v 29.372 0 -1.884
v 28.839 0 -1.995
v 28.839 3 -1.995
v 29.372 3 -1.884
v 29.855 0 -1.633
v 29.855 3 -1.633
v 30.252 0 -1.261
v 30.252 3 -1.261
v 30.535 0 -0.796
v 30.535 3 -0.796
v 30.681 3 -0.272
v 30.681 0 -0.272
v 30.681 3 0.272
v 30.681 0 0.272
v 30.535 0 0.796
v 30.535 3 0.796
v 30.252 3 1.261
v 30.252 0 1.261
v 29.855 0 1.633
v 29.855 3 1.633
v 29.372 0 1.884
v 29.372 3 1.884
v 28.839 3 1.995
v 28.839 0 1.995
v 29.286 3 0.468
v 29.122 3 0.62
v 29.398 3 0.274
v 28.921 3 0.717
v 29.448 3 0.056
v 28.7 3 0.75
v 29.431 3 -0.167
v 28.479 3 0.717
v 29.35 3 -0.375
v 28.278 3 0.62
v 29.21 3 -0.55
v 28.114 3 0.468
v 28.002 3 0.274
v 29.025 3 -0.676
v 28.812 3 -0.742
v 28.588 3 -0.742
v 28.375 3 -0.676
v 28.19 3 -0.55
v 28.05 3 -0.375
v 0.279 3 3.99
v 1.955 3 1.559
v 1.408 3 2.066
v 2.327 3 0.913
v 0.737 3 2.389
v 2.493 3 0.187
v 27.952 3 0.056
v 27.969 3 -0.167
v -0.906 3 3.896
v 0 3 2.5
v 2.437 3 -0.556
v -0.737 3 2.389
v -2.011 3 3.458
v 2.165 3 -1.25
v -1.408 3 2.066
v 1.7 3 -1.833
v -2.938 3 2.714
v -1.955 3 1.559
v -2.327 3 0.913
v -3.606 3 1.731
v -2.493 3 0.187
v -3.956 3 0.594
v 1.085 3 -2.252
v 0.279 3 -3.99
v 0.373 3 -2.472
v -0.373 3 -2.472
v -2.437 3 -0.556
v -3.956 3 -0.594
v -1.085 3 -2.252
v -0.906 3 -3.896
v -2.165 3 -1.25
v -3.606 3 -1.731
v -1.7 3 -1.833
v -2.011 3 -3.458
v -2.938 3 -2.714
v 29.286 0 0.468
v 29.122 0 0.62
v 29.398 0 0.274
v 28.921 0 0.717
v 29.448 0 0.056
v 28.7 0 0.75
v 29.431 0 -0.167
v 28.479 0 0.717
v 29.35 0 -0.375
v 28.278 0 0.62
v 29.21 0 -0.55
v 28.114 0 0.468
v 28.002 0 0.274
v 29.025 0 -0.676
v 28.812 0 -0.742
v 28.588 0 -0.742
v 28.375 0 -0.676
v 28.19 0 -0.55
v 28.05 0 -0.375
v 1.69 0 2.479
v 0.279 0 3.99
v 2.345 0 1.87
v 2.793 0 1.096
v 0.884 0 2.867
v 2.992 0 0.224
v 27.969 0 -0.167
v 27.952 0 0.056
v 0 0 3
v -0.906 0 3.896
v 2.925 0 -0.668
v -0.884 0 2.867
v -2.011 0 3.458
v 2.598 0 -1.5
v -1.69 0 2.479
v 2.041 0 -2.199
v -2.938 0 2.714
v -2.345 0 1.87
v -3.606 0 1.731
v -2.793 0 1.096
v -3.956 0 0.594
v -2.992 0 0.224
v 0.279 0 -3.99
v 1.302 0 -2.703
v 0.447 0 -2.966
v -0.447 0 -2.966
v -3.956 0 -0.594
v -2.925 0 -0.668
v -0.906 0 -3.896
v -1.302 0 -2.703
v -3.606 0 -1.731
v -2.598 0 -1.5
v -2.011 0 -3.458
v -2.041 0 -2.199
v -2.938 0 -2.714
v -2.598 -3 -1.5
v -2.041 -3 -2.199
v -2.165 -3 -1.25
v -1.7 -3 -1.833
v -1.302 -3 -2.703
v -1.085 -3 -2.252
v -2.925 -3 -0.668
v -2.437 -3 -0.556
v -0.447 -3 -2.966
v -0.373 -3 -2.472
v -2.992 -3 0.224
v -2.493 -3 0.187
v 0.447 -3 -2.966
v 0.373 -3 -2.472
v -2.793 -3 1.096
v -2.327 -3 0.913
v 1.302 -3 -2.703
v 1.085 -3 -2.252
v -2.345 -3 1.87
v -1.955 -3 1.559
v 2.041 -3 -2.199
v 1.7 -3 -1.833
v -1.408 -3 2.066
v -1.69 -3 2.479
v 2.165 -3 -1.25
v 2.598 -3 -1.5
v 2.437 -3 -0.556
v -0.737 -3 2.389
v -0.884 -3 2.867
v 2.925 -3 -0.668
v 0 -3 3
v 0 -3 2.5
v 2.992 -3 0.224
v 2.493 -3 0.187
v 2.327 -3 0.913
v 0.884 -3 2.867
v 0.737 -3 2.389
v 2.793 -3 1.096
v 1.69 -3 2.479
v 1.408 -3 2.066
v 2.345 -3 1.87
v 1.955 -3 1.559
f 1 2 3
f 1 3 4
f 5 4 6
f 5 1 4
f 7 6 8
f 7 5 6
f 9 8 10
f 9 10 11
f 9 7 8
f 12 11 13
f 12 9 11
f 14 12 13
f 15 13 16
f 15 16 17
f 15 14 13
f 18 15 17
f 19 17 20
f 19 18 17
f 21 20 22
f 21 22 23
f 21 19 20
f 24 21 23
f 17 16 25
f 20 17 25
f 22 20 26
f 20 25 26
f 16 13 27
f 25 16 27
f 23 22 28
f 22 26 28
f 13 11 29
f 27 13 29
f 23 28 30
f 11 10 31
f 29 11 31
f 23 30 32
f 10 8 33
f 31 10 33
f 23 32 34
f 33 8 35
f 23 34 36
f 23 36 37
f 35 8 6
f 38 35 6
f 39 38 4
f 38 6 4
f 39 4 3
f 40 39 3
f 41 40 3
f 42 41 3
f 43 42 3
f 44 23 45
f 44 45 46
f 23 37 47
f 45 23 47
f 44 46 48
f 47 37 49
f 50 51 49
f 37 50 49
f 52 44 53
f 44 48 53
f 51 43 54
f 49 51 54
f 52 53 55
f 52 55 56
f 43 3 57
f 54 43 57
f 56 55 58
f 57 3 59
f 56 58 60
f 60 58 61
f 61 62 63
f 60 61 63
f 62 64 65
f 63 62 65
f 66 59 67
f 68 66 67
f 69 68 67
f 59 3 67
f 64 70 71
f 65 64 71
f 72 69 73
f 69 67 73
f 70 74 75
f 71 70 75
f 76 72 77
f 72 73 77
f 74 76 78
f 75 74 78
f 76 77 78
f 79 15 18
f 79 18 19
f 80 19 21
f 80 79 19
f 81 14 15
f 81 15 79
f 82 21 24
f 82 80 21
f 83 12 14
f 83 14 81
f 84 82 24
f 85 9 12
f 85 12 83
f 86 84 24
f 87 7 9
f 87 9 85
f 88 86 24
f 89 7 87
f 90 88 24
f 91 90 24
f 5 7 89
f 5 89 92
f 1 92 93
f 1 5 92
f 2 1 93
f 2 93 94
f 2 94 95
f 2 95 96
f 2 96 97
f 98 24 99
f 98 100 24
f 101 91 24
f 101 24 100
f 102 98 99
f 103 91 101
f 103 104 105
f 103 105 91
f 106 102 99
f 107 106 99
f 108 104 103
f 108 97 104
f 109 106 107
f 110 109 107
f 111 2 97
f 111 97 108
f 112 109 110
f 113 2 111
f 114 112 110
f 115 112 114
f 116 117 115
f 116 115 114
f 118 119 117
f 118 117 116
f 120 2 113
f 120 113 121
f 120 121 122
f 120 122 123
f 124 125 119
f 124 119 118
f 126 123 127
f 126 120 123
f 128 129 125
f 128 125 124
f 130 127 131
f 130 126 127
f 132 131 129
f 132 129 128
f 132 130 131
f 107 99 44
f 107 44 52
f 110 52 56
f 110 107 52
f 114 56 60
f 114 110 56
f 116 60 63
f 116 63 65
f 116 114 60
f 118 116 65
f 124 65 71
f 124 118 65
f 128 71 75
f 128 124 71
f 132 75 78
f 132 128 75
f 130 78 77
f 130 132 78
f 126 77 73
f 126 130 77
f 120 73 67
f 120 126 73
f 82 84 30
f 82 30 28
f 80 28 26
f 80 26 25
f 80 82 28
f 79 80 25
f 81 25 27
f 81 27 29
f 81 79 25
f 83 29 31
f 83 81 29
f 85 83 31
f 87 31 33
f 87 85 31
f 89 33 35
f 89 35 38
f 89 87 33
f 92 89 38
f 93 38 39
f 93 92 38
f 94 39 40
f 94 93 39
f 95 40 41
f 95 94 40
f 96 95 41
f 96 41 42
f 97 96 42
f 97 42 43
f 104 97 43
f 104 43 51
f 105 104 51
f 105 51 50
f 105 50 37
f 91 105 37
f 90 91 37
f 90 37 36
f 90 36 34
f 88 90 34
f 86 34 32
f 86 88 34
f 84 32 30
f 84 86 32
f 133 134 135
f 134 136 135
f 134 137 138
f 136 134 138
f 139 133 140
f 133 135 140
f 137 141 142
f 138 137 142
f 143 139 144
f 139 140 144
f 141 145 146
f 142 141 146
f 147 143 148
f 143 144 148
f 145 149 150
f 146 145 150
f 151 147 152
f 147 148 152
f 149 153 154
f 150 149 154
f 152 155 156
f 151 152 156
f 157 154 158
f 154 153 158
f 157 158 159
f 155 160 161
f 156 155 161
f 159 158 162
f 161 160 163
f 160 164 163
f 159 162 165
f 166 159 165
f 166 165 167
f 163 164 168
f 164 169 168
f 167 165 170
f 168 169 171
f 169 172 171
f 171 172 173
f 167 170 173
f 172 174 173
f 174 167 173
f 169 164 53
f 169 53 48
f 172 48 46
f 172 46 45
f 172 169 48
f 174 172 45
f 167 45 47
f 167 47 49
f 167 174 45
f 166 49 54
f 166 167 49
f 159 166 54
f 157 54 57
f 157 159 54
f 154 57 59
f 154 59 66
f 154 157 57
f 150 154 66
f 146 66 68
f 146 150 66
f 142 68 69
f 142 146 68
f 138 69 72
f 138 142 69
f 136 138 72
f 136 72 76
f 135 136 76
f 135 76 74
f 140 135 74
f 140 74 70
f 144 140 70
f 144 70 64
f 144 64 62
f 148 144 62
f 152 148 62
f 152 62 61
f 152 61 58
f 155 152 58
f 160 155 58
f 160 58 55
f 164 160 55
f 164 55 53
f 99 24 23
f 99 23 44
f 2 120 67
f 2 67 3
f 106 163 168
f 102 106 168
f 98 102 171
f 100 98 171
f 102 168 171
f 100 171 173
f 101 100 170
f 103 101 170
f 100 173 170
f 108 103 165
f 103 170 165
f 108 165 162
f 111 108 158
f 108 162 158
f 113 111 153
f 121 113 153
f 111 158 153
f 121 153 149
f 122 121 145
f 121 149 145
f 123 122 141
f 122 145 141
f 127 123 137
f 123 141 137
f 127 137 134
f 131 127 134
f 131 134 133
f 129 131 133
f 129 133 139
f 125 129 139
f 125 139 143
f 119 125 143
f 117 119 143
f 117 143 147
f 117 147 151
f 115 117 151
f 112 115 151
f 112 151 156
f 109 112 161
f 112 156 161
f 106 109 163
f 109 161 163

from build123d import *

# Parameters (mm, degrees)
SKETCH1_R           = 2.5
SKETCH1_R_2         = 0.75
BOSS_EXTRUDE1_DEPTH = 3
BOSS_EXTRUDE2_START = -6
SKETCH2_R           = 3
SKETCH2_R_2         = 2.5
BOSS_EXTRUDE2_DEPTH = 3


with BuildPart() as part:
    # Sketch1 → Boss-Extrude1 (new body)
    with BuildSketch(Plane(origin=(0, 0, 0), x_dir=(1, 0, 0), z_dir=(0, 1, 0))):
        with BuildLine():
            Line((0.278745645, 3.990275788), (28.839372822, 1.995137894))
            ThreePointArc((28.839372822, 1.995137894), (30.7, 0), (28.839372822, -1.995137894))
            Line((28.839372822, -1.995137894), (0.278745645, -3.990275788))
            ThreePointArc((0.278745645, -3.990275788), (-4, 0), (0.278745645, 3.990275788))
        make_face()
        with Locations(Location((0, 0, 0), (0, 0, 270))):
            Circle(SKETCH1_R, mode=Mode.SUBTRACT)
        with Locations(Location((28.7, 0, 0), (0, 0, 270))):
            Circle(SKETCH1_R_2, mode=Mode.SUBTRACT)
    extrude(amount=BOSS_EXTRUDE1_DEPTH)

    # Sketch2 → Boss-Extrude2 (add)
    with BuildSketch(Plane(origin=(0, 3, 0), x_dir=(1, 0, 0), z_dir=(0, 1, 0)).offset(BOSS_EXTRUDE2_START)):
        with Locations(Location((0, 0, 0), (0, 0, 270))):
            Circle(SKETCH2_R)
        with Locations(Location((0, 0, 0), (0, 0, 270))):
            Circle(SKETCH2_R_2, mode=Mode.SUBTRACT)
    extrude(amount=BOSS_EXTRUDE2_DEPTH)


solid = part.part
